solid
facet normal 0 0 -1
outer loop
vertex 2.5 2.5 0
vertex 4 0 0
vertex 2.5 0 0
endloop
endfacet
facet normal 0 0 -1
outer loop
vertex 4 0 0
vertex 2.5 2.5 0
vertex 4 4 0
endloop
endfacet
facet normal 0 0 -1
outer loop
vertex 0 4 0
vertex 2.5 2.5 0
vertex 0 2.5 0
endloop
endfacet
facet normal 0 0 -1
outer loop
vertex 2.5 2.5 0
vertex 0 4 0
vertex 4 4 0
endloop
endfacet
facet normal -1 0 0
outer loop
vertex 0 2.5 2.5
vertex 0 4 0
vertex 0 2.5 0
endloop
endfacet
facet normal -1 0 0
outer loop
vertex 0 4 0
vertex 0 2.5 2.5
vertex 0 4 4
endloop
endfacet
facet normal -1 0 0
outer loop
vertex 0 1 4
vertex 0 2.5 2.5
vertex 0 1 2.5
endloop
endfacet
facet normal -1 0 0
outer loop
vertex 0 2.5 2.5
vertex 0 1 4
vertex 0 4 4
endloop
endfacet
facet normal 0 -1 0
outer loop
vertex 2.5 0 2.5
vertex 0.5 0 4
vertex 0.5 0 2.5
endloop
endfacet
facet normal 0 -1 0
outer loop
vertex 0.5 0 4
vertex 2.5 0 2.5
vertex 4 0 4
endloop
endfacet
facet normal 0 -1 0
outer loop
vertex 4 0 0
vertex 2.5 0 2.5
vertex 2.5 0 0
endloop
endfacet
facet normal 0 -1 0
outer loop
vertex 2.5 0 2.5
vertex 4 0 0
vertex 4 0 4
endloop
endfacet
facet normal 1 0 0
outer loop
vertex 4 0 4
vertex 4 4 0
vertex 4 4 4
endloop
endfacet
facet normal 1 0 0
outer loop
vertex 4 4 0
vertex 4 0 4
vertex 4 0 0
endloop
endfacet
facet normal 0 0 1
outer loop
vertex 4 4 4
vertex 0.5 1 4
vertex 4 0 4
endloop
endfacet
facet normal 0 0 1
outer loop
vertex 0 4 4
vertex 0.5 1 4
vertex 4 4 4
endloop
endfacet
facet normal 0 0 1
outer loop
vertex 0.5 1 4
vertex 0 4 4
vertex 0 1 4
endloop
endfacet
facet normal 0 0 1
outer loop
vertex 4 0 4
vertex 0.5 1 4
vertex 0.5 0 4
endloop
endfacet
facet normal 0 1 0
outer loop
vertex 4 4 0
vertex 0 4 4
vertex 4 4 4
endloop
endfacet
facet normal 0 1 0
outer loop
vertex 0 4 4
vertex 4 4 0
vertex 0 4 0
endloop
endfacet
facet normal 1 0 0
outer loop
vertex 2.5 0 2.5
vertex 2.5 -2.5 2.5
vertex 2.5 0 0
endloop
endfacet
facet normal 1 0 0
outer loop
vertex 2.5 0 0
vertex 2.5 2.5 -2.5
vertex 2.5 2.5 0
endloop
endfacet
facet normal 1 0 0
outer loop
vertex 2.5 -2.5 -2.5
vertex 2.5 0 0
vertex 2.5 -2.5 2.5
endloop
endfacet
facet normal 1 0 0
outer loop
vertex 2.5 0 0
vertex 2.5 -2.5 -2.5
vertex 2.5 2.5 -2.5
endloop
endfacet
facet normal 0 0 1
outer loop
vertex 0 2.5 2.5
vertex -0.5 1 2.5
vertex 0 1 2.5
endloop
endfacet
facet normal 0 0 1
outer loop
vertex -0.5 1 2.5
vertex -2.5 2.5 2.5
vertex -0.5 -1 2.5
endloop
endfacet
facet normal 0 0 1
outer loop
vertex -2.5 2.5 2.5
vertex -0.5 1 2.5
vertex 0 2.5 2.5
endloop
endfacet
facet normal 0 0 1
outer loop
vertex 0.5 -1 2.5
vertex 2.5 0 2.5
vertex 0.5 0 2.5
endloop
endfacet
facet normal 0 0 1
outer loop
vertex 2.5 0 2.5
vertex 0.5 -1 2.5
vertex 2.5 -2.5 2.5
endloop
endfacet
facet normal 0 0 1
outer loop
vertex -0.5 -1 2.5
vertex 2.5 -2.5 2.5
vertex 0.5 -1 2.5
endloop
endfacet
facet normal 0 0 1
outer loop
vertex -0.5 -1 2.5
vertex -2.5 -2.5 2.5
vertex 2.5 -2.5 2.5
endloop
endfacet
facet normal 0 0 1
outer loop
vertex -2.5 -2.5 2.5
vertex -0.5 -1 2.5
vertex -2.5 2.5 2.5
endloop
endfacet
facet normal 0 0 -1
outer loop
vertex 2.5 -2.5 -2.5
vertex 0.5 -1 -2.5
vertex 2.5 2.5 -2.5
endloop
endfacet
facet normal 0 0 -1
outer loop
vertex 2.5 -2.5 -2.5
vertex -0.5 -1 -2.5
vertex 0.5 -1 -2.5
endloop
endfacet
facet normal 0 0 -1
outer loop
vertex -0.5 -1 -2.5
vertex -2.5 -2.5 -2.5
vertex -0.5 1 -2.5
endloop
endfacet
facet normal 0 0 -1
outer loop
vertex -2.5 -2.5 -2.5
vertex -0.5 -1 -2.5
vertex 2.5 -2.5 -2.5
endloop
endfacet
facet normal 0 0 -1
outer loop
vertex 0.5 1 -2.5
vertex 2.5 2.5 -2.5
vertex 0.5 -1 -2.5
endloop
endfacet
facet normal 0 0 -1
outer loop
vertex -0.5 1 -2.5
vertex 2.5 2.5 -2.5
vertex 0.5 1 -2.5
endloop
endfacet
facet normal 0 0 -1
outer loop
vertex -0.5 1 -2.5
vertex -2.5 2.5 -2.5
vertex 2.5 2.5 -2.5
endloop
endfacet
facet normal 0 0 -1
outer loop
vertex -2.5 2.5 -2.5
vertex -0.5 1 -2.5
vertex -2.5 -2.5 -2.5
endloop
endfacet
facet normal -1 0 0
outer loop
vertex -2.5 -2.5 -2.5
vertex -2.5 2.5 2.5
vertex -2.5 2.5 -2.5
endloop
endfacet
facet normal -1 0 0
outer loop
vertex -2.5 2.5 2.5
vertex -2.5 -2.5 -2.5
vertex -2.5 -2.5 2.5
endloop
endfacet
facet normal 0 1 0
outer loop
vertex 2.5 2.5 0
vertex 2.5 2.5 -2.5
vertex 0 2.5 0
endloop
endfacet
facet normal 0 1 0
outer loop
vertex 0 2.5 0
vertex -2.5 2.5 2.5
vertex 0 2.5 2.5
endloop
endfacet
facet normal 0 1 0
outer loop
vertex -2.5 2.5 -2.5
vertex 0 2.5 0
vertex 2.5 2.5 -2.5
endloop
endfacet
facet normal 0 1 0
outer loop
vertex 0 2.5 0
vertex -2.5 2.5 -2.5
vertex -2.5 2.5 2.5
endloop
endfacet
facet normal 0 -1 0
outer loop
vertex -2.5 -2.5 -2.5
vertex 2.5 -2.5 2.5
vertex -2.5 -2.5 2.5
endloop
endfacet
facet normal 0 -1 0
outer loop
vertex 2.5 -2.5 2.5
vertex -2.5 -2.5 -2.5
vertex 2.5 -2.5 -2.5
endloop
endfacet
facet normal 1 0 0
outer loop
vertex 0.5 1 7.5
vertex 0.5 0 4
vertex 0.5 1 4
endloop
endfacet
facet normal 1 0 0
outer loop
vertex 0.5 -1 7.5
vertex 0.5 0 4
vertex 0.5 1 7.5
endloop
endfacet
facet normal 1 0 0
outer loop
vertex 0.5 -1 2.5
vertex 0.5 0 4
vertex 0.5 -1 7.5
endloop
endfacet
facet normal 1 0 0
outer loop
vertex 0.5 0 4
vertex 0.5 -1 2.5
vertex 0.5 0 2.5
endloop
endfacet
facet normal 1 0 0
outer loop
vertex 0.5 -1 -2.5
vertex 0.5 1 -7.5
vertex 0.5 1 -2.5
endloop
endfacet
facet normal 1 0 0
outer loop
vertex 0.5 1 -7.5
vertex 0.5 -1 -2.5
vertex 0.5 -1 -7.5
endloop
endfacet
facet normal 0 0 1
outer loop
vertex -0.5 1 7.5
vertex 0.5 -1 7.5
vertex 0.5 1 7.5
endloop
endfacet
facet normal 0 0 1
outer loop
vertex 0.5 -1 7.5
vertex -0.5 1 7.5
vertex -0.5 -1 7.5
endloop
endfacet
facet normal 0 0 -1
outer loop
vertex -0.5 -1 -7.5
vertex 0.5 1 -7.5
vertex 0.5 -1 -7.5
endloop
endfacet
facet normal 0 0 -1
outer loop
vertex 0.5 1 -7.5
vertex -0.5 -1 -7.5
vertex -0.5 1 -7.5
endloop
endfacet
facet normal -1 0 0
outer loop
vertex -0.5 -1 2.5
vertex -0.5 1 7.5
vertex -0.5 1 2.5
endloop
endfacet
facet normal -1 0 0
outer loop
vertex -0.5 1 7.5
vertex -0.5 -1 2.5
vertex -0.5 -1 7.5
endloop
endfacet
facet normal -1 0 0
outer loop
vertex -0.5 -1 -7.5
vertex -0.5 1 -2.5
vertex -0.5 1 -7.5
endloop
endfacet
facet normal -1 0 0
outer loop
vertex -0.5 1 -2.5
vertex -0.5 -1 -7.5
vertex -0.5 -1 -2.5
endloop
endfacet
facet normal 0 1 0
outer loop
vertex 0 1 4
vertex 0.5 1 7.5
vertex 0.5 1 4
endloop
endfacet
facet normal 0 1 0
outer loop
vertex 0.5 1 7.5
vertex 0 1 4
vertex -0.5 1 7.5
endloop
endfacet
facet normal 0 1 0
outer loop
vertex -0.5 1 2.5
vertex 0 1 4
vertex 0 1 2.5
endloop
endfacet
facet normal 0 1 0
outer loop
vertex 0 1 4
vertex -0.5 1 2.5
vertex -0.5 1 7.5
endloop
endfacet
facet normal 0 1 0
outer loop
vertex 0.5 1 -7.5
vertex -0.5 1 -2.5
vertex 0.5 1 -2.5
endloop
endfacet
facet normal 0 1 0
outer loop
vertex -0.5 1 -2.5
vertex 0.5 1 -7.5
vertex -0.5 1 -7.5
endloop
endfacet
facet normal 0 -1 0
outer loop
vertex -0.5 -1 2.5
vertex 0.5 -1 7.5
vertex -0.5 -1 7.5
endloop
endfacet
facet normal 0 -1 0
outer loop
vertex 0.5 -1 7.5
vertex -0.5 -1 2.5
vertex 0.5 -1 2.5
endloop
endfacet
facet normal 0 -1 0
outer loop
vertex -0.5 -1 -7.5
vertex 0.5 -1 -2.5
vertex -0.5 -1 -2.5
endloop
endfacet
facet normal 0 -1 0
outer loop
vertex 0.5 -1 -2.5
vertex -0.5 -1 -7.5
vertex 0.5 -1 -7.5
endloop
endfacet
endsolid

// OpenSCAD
///@file 1cube.scad
/* OpenSCAD - demo - Dave Harris - May22
 The Programmers Solid 3D CAD Modeller

 Using  v2021.01 on Ubuntu.
See https://openscad.org/downloads
    https://openscad.org/cheatsheet
Important keyboard keys...
 F5 previews the 3D model code.
 F6 renders model, ready for export.
 F7 exports model to .STL file
Keep an eye on lower panes,
      named Console and Error-Log.
 
OpenSCAD dimensions are in 'unit's,
 the Slicer program, scales units.

Origin is at intersection of 3 axes. */

cube( 3 ); // object 1, size 3 units.

# cube(4);  // object 2, encloses obj 1.
            // # is a debug feature

cube( 5, center=true );    // object 3.

/* A vector is position of a point in
   space. It is expressed as [x, y, z].
   Can also specify an object size    */

color("blue")              // object 4.
  cube( [ 1, 2, 15 ], center=true ); 

/* color() is an OpenSCAD debug feature.
   Colour is not exported to STL file.
   color() statement applies ONLY to
   the statement or block that follows.

 The above 4 objects are in an implicit
  union, that is they form one object.
 A union is explicit when defined by
   a union() block.                  */
//---------EoF-------
